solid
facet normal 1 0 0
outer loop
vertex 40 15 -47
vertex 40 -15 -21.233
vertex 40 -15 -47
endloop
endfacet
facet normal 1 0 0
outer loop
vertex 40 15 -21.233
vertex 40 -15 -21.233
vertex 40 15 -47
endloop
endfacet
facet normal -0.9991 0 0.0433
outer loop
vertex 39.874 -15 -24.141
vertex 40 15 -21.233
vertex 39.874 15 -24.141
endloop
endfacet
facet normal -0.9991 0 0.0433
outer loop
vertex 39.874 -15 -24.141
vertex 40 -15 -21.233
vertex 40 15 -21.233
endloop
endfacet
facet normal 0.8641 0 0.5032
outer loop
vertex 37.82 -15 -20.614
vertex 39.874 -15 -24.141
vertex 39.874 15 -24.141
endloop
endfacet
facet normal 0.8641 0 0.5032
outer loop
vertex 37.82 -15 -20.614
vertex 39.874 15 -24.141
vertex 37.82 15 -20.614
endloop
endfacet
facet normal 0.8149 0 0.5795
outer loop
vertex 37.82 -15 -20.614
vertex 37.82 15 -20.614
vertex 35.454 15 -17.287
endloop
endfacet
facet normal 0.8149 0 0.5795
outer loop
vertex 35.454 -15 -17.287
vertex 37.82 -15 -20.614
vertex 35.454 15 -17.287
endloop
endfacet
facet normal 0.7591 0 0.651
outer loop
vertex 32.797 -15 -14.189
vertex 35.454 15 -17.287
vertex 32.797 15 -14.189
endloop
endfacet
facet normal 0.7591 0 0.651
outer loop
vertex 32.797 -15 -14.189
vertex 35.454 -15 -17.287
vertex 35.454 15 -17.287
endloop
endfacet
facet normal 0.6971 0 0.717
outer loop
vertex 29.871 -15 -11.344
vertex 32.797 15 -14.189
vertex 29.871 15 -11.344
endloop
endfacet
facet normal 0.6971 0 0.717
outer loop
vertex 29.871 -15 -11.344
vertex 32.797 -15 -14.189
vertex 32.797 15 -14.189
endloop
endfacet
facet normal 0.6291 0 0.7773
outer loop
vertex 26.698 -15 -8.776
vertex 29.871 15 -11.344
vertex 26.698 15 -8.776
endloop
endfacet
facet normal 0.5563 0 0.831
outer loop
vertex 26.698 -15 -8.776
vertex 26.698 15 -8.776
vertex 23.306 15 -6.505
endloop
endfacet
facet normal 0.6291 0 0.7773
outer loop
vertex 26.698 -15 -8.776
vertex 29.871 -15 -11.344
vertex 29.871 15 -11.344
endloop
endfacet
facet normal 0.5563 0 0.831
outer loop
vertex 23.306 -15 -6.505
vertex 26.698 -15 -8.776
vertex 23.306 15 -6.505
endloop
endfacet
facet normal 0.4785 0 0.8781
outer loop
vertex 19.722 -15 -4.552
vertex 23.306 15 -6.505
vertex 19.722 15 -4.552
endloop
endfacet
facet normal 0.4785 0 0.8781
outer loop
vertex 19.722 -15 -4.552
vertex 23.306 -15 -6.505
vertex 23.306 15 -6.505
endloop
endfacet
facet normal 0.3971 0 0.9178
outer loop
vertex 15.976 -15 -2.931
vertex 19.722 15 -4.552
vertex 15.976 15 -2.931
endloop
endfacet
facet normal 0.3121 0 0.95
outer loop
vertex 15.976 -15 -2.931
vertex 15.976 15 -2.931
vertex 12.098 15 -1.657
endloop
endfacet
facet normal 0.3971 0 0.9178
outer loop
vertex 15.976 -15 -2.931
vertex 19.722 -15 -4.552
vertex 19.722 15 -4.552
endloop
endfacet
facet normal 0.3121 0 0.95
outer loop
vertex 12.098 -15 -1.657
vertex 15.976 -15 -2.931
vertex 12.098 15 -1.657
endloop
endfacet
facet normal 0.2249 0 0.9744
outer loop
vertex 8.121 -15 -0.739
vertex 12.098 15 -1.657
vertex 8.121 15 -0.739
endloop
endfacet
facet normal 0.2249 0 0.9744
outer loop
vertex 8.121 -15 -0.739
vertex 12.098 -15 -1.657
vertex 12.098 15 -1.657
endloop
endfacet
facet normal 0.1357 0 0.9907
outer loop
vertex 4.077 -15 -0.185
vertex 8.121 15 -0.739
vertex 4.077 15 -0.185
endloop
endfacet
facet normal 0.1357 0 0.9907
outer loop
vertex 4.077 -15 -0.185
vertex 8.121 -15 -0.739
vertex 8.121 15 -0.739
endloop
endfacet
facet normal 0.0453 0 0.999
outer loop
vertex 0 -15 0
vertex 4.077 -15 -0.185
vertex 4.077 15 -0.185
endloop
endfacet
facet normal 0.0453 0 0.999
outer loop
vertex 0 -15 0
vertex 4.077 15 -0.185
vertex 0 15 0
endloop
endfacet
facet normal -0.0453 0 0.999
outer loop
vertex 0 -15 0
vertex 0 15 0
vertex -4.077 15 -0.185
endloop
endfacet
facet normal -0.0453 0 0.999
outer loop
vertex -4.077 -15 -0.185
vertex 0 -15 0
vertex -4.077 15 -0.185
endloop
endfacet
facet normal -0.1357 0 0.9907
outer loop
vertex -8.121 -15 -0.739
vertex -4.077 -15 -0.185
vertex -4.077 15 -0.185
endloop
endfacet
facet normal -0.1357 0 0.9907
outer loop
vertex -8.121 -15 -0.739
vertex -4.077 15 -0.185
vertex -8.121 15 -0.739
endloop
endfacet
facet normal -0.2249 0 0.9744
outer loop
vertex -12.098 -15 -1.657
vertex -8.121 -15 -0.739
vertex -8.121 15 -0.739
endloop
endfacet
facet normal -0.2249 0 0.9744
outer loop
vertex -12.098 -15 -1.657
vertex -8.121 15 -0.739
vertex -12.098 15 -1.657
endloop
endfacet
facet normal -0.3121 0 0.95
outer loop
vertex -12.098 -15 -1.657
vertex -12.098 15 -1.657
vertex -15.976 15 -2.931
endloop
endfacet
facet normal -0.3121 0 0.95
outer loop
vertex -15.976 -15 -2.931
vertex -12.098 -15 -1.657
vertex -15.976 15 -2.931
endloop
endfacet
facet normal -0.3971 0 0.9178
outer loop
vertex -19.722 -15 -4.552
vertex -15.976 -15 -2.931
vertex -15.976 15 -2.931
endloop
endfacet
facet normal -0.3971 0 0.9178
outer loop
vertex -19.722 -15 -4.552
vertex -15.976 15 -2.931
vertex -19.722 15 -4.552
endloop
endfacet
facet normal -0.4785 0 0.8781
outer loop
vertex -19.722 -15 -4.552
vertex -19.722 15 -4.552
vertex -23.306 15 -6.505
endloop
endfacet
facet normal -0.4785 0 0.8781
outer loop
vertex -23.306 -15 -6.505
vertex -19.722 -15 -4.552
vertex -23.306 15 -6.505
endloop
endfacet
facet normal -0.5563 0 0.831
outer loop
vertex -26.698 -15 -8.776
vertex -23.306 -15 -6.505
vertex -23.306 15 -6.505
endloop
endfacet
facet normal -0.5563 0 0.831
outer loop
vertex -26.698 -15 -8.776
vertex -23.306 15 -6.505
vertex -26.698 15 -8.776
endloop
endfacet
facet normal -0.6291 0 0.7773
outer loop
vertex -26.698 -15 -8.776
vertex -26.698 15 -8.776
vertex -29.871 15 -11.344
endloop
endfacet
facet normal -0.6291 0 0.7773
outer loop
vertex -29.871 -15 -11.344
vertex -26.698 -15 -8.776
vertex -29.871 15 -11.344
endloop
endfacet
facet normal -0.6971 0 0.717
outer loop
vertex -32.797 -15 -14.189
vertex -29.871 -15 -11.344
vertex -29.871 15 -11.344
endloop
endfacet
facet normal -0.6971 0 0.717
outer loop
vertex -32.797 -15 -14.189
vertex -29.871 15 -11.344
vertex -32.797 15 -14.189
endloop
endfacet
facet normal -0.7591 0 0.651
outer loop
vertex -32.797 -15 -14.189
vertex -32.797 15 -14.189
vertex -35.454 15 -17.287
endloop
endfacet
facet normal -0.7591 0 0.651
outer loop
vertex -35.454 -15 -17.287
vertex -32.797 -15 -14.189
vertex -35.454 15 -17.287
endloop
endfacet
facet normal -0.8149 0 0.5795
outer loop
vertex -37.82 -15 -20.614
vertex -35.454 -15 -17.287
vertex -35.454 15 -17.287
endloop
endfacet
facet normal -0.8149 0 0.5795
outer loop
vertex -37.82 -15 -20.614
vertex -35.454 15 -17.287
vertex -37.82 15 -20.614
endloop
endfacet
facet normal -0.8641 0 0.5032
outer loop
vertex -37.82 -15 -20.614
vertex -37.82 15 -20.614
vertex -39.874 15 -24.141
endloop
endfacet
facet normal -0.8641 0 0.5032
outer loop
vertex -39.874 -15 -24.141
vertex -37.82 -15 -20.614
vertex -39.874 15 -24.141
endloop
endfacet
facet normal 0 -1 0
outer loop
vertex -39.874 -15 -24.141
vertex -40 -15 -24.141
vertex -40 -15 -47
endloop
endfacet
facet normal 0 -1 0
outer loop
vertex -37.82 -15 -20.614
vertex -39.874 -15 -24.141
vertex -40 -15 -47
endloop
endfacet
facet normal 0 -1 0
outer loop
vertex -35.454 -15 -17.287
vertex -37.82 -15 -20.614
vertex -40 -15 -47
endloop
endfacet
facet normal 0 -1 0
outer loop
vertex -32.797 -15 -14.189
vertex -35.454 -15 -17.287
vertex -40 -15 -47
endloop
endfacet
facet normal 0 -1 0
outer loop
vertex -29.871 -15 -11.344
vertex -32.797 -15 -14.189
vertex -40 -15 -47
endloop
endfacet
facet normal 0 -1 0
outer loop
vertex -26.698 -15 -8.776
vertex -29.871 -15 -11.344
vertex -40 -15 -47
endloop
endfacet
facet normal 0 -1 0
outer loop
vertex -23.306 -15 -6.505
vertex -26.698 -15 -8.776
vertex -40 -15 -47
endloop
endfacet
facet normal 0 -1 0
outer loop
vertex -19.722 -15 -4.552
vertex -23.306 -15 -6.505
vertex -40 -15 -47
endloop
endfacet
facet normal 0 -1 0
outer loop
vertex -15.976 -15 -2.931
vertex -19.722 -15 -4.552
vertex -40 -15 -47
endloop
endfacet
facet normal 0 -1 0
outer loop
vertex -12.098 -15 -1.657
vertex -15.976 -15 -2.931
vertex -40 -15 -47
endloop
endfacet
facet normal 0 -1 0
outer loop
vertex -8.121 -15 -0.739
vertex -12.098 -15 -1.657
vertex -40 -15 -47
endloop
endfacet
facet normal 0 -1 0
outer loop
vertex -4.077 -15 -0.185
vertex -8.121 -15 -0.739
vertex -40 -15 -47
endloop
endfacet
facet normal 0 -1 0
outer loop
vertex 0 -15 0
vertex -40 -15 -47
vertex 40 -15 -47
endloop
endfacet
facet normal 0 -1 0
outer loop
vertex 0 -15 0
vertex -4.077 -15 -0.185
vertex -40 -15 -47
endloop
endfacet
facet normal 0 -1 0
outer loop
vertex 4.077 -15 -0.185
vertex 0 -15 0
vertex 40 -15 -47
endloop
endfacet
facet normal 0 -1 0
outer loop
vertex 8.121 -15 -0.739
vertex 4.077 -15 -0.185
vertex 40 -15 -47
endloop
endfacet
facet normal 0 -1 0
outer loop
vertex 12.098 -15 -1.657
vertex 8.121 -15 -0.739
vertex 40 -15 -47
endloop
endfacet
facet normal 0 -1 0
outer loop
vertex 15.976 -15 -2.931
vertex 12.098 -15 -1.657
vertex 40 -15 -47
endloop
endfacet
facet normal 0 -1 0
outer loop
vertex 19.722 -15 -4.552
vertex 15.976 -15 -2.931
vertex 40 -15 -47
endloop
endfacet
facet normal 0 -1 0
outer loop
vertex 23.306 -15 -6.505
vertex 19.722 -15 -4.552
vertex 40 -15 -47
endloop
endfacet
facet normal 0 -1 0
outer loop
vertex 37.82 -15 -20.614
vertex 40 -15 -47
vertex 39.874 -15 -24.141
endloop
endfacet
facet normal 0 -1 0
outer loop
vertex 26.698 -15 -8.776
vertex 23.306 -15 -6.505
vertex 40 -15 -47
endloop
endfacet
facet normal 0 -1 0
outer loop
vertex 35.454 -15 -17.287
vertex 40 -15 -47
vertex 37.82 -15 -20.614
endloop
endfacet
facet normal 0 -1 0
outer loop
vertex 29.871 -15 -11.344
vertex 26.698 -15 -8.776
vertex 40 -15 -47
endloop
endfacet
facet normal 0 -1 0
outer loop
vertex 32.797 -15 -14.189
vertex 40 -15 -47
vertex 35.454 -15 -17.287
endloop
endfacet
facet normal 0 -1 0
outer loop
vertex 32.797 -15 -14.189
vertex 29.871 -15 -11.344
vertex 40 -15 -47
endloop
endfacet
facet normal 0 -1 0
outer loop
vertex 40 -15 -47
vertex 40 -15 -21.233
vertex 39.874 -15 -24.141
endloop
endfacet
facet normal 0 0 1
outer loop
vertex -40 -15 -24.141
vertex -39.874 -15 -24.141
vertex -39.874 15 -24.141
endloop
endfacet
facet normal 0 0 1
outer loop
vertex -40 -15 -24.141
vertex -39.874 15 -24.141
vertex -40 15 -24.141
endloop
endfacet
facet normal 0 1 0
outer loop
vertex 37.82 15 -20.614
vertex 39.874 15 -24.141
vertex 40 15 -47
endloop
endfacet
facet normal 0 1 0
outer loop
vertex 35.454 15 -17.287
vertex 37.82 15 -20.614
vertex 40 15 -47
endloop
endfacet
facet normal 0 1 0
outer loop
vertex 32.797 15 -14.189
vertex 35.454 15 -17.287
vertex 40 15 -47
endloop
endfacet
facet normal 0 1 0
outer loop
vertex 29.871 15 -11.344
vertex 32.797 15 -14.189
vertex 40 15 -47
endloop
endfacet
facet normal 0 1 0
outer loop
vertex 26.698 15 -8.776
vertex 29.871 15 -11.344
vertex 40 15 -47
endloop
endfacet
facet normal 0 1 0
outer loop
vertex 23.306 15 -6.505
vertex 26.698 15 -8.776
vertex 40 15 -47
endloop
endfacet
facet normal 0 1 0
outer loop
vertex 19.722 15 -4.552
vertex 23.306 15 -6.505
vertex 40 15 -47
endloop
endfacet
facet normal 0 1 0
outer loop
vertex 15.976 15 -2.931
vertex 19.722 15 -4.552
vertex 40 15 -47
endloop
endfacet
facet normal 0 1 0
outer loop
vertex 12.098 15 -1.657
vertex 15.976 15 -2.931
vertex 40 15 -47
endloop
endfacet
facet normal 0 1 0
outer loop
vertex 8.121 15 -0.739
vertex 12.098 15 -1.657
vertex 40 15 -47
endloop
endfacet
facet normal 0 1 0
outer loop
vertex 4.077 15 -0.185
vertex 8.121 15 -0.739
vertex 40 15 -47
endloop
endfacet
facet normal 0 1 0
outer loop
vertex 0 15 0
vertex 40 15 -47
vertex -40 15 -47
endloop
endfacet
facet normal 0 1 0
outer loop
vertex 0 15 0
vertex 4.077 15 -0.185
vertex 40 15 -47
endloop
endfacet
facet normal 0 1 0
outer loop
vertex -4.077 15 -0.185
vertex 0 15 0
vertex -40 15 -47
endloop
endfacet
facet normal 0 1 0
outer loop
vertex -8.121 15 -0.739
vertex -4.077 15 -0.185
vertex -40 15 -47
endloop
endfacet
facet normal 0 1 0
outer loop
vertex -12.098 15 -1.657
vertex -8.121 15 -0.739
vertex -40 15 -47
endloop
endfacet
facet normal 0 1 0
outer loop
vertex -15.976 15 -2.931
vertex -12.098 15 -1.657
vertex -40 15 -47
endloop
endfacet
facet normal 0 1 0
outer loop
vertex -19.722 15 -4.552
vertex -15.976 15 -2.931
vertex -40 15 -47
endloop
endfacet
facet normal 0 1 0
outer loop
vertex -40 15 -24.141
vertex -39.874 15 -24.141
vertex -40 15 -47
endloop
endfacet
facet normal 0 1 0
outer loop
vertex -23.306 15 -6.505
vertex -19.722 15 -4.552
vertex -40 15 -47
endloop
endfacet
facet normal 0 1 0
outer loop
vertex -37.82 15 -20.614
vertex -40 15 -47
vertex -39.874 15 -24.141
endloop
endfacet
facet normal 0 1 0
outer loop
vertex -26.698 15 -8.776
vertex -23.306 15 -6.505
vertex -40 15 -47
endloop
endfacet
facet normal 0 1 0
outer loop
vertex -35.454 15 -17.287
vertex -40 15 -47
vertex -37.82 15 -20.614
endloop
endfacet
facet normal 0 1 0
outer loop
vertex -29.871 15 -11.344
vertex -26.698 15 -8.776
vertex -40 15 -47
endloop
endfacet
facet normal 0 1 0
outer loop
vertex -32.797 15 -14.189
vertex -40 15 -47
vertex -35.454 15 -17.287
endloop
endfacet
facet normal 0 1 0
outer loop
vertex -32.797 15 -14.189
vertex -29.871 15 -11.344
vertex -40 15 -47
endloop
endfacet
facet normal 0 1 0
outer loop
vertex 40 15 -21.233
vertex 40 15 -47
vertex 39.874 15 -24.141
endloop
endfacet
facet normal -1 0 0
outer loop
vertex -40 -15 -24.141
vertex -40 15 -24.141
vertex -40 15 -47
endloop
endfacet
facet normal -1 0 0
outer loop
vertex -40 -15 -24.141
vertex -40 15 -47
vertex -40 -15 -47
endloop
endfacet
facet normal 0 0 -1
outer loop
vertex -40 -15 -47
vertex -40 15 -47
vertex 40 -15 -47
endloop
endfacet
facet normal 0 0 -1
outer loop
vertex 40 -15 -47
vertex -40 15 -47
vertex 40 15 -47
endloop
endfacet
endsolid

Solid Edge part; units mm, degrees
sketch "Sketch1" plane through (0, 0, 0) normal (0, 0, 1) x (1, 0, 0)
  line L0 (-40, -15) -> (40, -15)
  line L1 (40, -15) -> (40, 15)
  line L2 (40, 15) -> (-40, 15)
  line L3 (-40, 15) -> (-40, -15)
extrude "Protrusion1" add sketch "Sketch1" against normal blind 47
sketch "Sketch2" plane through (0, -15, -23.5) normal (0, -1, 0) x (1, 0, 0)
  arc A0 (39.8736, -0.641) -> (-39.8736, -0.641) centre (0, -21.5) ccw
  line L0 (-39.8736, -0.641) -> (-39.8736, 31.8802)
  line L1 (-39.8736, 31.8802) -> (41.2874, 31.8802)
  line L2 (41.2874, 31.8802) -> (39.8736, -0.641)
extrude "Recorte_Extrudado_3" cut sketch "Sketch2" against normal blind 30
sketch "Sketch3" plane through (0, -15, -23.5) normal (0, -1, 0) x (1, 0, 0)
  line L0 (-39.8736, -0.641) -> (-45.2071, -0.641)
  line L1 (-45.2071, -0.641) -> (-45.2071, 27.0459)
  line L2 (-45.2071, 27.0459) -> (-33.448, 27.0459)
  line L3 (-33.448, 27.0459) -> (-39.8736, -0.641)
extrude "Recorte_Extrudado_4" cut sketch "Sketch3" against normal blind 30
